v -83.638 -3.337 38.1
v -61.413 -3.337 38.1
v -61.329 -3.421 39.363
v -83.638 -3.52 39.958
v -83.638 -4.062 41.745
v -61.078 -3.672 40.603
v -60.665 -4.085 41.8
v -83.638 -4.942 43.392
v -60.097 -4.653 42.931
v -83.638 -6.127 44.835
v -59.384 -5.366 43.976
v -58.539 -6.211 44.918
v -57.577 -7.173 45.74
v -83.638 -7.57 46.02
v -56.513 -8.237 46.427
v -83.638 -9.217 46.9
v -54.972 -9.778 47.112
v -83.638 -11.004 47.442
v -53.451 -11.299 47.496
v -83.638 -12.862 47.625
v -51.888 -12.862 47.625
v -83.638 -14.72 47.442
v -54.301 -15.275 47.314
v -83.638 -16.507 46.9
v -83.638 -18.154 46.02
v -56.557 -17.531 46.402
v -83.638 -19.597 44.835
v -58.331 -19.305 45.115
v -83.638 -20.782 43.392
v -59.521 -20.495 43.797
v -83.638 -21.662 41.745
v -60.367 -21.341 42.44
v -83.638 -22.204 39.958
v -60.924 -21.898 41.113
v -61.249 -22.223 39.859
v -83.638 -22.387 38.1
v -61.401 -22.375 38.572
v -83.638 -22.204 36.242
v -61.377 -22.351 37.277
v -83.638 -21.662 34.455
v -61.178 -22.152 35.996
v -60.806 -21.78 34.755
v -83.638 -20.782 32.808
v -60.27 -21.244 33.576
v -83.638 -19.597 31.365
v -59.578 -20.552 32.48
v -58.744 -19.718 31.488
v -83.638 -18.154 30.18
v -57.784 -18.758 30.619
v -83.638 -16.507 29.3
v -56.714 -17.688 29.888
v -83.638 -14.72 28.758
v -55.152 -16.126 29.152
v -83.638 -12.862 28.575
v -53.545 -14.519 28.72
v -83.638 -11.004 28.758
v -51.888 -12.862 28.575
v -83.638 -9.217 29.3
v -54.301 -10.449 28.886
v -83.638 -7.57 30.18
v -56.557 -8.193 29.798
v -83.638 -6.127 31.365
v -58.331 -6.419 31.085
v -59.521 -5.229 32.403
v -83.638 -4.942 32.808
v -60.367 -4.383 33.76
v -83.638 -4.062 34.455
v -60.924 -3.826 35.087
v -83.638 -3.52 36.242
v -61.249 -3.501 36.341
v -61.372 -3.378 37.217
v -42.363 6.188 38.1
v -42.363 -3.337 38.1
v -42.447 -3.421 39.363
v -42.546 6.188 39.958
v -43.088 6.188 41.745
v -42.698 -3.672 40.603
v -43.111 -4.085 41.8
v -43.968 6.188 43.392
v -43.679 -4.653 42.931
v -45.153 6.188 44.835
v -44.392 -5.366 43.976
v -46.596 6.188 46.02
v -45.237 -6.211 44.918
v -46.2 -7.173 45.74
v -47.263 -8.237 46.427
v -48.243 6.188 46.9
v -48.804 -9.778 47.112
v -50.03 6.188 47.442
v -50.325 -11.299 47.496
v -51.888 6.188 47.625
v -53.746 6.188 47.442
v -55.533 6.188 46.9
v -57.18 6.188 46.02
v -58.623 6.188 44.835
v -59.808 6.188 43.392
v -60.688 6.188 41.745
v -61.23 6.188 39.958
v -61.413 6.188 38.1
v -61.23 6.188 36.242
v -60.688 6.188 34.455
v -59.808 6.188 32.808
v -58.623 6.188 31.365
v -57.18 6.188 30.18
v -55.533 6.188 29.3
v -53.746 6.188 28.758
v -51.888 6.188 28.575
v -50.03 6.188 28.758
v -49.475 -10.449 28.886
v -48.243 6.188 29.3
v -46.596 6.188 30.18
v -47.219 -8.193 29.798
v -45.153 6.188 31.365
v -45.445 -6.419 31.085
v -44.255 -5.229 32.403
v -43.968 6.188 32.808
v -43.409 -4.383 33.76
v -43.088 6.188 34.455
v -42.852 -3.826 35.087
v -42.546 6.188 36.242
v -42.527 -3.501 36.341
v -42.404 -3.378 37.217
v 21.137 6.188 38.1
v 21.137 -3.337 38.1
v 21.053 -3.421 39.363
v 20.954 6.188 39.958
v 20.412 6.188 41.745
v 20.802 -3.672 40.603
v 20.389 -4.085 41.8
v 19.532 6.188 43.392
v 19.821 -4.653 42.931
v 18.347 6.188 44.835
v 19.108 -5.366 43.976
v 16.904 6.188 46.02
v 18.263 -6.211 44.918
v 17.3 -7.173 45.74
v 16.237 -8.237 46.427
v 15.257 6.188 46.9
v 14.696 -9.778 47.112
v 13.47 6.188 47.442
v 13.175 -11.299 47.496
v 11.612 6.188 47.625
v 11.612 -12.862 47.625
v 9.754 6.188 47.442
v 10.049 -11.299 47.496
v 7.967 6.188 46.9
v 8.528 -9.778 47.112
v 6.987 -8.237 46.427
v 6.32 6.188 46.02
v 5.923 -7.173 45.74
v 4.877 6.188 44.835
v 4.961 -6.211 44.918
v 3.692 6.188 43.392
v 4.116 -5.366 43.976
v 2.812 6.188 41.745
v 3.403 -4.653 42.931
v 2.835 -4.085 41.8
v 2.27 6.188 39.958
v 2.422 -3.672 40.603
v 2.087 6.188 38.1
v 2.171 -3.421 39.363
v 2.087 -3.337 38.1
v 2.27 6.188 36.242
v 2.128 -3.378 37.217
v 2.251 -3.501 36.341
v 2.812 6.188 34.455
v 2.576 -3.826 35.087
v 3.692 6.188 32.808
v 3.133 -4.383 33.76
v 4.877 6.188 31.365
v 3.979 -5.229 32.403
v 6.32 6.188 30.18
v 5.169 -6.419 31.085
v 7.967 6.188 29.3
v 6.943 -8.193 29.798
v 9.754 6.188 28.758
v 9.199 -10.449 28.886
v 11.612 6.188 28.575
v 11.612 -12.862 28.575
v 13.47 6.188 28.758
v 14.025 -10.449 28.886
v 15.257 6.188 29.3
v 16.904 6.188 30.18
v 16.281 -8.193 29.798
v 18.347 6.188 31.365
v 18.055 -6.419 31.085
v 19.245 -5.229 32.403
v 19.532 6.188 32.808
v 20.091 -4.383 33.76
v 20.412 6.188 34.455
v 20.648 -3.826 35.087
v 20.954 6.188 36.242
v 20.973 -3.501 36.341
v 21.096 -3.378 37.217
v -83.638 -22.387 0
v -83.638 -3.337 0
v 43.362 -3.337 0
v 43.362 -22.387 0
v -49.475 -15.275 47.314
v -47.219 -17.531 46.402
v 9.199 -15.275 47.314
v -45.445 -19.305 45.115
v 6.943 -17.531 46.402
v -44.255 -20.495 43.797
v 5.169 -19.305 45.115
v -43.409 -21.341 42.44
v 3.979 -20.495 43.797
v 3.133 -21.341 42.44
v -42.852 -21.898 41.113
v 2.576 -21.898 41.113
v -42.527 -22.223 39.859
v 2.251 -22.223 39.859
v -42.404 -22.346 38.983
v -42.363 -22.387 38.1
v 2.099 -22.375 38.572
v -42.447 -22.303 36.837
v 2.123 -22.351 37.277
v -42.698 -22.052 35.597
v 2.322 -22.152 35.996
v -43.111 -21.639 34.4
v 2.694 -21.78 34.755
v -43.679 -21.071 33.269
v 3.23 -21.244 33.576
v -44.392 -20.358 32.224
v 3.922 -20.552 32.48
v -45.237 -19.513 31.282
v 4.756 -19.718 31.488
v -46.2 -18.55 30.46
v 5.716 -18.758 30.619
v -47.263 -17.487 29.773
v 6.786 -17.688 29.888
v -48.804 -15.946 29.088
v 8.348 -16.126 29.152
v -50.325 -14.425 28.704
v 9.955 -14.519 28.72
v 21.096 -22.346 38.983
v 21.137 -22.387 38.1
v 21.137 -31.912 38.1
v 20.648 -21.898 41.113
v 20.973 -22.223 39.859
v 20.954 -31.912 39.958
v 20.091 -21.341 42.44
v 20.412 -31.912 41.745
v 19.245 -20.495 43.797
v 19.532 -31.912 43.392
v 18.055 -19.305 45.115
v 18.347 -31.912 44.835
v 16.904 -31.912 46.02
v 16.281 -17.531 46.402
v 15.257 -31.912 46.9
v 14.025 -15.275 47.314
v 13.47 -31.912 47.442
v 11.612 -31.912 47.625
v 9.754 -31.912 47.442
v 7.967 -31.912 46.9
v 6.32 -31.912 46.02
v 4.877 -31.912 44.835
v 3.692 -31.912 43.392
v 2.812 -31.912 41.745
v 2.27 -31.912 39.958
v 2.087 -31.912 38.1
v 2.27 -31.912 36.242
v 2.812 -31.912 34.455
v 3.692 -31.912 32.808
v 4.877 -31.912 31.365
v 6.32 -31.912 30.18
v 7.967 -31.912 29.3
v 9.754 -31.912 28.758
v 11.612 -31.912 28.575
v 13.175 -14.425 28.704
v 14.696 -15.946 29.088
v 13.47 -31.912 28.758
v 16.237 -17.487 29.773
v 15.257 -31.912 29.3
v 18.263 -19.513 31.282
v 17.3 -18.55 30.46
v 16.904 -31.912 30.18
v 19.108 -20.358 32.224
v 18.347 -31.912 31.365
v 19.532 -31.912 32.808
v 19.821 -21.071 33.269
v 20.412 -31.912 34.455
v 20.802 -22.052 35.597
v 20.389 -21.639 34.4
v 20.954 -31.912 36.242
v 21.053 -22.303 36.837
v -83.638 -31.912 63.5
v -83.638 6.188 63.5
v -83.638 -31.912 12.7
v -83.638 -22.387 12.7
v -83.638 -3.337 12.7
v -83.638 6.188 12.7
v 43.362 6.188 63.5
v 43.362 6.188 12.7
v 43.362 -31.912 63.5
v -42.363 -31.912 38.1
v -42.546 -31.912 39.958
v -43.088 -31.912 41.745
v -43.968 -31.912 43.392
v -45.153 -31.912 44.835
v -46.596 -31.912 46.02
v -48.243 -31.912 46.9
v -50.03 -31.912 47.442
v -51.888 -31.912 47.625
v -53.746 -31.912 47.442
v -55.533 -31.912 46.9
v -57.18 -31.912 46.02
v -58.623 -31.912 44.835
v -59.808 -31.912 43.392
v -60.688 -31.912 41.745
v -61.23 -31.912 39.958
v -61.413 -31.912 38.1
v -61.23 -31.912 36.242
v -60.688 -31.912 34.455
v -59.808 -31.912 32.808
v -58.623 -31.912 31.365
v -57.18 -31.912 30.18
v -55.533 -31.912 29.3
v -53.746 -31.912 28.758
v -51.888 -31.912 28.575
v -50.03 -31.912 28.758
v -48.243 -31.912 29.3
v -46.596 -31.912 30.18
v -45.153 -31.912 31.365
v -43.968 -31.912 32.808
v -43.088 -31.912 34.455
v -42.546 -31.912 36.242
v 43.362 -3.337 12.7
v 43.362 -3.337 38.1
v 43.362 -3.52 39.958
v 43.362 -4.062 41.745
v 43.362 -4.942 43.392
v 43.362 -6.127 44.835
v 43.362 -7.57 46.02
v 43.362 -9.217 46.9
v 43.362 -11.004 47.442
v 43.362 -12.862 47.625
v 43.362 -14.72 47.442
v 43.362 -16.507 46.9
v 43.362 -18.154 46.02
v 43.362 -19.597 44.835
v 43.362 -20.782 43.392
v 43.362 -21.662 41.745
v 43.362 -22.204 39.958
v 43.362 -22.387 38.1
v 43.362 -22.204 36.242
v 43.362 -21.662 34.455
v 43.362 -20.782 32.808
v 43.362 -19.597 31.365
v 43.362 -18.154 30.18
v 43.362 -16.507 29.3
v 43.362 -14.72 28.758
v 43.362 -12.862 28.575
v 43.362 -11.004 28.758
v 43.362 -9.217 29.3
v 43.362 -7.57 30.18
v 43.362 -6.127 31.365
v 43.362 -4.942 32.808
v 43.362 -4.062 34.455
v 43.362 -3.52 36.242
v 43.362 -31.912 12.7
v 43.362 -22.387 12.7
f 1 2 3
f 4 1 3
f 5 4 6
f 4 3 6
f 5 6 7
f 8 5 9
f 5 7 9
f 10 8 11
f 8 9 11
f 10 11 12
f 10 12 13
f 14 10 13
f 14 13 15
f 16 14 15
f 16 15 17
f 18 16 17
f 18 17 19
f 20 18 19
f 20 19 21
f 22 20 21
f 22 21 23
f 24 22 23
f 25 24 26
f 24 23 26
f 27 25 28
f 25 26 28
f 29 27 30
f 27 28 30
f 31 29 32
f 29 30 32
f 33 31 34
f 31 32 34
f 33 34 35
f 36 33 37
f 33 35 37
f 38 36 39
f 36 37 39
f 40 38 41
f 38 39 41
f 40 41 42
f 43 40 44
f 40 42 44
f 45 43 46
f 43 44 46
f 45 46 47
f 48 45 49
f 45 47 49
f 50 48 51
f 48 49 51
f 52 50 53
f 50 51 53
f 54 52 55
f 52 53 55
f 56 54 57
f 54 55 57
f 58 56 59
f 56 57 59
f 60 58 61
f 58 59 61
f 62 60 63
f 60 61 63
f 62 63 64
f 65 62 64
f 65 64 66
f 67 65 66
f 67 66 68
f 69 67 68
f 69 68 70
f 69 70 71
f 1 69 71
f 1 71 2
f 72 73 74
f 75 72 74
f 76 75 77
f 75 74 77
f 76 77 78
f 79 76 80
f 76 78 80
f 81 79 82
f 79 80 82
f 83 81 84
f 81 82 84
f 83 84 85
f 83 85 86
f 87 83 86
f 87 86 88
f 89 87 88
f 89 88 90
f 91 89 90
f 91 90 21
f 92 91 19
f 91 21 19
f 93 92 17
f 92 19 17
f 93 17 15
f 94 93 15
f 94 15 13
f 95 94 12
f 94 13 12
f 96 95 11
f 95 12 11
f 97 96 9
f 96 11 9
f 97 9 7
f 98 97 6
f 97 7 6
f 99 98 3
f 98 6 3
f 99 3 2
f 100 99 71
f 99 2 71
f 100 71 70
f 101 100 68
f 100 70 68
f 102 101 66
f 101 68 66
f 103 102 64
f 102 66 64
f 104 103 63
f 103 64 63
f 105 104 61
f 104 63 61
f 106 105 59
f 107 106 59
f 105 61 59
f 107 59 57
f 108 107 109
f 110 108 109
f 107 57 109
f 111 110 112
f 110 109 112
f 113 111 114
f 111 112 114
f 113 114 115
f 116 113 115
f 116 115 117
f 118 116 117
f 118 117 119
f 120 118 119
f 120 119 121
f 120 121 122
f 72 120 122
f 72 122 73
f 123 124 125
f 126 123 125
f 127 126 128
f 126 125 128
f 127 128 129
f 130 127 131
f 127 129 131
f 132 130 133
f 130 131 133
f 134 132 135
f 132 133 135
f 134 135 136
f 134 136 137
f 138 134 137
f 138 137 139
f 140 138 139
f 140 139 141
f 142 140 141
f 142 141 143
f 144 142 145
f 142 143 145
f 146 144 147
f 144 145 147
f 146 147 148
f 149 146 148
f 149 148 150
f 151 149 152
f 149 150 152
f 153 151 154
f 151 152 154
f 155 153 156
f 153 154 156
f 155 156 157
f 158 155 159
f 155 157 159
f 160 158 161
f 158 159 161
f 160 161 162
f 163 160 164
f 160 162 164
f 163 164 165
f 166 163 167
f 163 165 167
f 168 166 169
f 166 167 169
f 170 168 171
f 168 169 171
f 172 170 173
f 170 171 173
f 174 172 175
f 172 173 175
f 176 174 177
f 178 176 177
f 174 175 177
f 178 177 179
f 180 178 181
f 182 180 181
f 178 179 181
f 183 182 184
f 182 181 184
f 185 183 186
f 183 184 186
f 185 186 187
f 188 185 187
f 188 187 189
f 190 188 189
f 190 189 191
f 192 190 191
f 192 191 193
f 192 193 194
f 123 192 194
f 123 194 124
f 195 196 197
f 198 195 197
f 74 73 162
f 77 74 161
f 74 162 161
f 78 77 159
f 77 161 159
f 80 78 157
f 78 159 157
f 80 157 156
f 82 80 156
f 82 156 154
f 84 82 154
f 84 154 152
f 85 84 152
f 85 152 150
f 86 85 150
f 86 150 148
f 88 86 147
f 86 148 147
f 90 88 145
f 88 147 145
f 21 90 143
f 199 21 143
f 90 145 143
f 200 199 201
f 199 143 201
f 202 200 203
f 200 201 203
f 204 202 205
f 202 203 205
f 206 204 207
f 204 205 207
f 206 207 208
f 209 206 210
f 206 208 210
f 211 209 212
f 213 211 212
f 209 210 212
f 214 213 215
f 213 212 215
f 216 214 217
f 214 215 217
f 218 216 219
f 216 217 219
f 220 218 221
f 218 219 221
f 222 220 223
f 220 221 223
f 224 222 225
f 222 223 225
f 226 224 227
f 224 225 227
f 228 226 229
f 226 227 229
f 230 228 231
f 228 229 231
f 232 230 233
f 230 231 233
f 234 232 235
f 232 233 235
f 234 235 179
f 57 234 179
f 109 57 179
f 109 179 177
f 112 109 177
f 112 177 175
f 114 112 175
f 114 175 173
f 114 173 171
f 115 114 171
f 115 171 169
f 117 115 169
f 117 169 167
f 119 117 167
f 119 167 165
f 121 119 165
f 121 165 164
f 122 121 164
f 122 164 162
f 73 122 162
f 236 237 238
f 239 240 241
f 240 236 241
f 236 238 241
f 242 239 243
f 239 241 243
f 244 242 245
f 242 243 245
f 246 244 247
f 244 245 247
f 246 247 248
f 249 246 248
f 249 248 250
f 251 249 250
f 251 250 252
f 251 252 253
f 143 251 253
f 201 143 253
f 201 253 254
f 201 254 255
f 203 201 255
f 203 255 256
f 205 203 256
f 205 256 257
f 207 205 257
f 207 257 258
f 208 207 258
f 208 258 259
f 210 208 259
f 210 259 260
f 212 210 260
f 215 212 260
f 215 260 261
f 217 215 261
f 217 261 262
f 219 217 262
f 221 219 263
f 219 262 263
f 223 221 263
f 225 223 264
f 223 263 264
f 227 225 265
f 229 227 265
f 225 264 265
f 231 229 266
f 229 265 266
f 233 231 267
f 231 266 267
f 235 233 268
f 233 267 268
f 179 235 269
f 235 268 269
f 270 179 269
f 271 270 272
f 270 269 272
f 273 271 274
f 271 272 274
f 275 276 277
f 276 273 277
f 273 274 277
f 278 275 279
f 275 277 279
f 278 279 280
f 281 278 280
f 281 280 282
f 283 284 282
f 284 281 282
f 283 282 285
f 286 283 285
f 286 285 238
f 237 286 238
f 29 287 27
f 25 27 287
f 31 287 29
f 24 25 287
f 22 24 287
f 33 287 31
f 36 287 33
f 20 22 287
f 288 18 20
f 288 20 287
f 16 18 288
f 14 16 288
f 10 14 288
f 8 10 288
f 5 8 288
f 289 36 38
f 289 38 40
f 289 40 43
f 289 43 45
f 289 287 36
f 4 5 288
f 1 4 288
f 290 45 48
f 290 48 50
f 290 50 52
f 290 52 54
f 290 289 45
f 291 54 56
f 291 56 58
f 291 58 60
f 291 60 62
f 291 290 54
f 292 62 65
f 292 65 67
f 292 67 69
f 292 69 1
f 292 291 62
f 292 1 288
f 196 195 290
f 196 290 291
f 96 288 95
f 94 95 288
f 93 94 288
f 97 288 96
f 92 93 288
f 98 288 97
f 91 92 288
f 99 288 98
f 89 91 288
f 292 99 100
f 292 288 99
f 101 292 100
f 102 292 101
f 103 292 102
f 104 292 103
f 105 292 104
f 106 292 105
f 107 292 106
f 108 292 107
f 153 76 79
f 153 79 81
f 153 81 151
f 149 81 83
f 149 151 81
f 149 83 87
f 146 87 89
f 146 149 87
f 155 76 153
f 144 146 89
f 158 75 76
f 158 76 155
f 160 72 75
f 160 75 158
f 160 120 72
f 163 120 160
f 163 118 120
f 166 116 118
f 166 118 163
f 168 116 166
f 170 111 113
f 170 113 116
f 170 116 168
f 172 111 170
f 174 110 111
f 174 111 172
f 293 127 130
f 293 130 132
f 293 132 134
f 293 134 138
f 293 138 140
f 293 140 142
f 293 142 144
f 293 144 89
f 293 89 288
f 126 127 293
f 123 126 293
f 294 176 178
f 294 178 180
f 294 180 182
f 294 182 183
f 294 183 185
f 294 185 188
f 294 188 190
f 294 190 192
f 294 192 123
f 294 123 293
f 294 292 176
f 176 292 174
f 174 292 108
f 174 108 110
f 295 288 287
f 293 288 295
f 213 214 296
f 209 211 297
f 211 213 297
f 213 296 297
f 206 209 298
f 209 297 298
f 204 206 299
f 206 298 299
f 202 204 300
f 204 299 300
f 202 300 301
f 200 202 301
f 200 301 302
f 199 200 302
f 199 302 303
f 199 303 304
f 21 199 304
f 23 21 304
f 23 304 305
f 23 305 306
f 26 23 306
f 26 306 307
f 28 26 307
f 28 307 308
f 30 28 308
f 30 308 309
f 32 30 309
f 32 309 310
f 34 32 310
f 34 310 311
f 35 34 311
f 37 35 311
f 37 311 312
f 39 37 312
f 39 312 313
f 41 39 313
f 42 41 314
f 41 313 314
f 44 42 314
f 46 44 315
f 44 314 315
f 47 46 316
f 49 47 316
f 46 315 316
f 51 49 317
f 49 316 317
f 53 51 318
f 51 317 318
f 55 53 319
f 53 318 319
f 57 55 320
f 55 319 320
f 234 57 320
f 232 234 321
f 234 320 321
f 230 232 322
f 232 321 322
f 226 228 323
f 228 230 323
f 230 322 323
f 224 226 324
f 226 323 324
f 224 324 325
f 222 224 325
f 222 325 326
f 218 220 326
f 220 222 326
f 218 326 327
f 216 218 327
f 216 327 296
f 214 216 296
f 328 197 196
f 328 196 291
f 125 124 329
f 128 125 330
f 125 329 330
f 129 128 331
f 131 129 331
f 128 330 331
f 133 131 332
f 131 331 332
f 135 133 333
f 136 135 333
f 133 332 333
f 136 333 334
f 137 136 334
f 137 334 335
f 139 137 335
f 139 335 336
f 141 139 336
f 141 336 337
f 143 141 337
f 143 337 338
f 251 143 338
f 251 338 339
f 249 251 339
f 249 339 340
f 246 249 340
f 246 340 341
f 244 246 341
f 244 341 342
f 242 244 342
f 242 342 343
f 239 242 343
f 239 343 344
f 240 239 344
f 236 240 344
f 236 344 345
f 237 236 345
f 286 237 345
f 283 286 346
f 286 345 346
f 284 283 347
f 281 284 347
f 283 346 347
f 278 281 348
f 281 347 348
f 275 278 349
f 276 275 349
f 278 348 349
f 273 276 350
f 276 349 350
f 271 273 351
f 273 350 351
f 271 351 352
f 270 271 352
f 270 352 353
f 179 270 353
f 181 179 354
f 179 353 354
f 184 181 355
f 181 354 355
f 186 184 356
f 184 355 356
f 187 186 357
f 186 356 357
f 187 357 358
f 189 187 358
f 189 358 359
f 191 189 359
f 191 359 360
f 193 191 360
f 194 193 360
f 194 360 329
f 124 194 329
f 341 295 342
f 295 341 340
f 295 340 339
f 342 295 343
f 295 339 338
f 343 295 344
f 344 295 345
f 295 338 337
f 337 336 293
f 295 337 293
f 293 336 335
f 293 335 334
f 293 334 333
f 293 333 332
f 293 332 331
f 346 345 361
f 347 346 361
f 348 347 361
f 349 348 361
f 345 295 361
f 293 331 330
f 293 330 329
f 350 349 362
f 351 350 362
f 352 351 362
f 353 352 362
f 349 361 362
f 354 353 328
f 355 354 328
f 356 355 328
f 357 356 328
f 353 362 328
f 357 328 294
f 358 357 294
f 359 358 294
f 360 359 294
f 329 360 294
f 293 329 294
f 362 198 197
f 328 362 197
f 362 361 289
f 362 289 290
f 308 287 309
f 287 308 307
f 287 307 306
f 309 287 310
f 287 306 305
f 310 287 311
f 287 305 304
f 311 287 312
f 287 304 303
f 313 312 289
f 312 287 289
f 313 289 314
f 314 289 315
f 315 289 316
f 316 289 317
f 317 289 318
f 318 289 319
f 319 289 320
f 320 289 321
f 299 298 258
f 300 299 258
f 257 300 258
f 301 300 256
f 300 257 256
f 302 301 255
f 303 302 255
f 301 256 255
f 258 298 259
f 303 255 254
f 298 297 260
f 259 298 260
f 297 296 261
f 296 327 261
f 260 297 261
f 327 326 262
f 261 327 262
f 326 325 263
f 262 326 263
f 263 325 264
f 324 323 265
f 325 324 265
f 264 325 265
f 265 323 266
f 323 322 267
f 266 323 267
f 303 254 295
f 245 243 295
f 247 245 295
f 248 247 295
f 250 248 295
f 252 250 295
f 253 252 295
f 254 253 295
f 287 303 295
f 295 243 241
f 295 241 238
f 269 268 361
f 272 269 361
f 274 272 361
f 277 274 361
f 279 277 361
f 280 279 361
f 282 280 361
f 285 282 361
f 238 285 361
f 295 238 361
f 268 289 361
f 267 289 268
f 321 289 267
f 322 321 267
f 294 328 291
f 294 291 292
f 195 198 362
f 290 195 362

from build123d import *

# Parameters (mm, degrees)
F0_W      = 127
F0_H      = 38.1
F1_DEPTH  = 63.5
F2_W      = 9.525
F2_H      = 12.7
F3_DEPTH  = 127.001
F4_W      = 9.525
F4_H      = 12.7
F5_DEPTH  = 127.001
F6_R      = 9.525
F7_DEPTH  = 127.001
F8_R      = 9.525
F9_DEPTH  = 38.101
F10_R     = 9.525
F11_DEPTH = 38.101


with BuildPart() as f1:
    # F0 (on Top) → F1 (new body)
    with BuildSketch(Plane.XY):
        with Locations((-20.138042, -12.861965)):
            Rectangle(F0_W, F0_H)
    extrude(amount=F1_DEPTH)

    # F2 (on face) → F3 (cut, through all)
    with BuildSketch(Plane.YZ.offset(43.361958)):
        with Locations((-27.149465, 6.35)):
            Rectangle(F2_W, F2_H)
    extrude(amount=-F3_DEPTH, mode=Mode.SUBTRACT)

    # F4 (on face) → F5 (cut, through all)
    with BuildSketch(Plane.YZ.offset(43.361958)):
        with Locations((1.425535, 6.35)):
            Rectangle(F4_W, F4_H)
    extrude(amount=-F5_DEPTH, mode=Mode.SUBTRACT)

    # F6 (on face) → F7 (cut, through all)
    with BuildSketch(Plane.YZ.offset(43.361958)):
        with Locations((-12.861965, 38.1)):
            Circle(F6_R)
    extrude(amount=-F7_DEPTH, mode=Mode.SUBTRACT)

    # F8 (on face) → F9 (cut, through all)
    with BuildSketch(Plane.XZ.offset(31.911965)):
        with Locations((-51.888042, 38.1)):
            Circle(F8_R)
    extrude(amount=-F9_DEPTH, mode=Mode.SUBTRACT)

    # F10 (on face) → F11 (cut, through all)
    with BuildSketch(Plane.XZ.offset(31.911965)):
        with Locations((11.611958, 38.1)):
            Circle(F10_R)
    extrude(amount=-F11_DEPTH, mode=Mode.SUBTRACT)


solid = f1.part
